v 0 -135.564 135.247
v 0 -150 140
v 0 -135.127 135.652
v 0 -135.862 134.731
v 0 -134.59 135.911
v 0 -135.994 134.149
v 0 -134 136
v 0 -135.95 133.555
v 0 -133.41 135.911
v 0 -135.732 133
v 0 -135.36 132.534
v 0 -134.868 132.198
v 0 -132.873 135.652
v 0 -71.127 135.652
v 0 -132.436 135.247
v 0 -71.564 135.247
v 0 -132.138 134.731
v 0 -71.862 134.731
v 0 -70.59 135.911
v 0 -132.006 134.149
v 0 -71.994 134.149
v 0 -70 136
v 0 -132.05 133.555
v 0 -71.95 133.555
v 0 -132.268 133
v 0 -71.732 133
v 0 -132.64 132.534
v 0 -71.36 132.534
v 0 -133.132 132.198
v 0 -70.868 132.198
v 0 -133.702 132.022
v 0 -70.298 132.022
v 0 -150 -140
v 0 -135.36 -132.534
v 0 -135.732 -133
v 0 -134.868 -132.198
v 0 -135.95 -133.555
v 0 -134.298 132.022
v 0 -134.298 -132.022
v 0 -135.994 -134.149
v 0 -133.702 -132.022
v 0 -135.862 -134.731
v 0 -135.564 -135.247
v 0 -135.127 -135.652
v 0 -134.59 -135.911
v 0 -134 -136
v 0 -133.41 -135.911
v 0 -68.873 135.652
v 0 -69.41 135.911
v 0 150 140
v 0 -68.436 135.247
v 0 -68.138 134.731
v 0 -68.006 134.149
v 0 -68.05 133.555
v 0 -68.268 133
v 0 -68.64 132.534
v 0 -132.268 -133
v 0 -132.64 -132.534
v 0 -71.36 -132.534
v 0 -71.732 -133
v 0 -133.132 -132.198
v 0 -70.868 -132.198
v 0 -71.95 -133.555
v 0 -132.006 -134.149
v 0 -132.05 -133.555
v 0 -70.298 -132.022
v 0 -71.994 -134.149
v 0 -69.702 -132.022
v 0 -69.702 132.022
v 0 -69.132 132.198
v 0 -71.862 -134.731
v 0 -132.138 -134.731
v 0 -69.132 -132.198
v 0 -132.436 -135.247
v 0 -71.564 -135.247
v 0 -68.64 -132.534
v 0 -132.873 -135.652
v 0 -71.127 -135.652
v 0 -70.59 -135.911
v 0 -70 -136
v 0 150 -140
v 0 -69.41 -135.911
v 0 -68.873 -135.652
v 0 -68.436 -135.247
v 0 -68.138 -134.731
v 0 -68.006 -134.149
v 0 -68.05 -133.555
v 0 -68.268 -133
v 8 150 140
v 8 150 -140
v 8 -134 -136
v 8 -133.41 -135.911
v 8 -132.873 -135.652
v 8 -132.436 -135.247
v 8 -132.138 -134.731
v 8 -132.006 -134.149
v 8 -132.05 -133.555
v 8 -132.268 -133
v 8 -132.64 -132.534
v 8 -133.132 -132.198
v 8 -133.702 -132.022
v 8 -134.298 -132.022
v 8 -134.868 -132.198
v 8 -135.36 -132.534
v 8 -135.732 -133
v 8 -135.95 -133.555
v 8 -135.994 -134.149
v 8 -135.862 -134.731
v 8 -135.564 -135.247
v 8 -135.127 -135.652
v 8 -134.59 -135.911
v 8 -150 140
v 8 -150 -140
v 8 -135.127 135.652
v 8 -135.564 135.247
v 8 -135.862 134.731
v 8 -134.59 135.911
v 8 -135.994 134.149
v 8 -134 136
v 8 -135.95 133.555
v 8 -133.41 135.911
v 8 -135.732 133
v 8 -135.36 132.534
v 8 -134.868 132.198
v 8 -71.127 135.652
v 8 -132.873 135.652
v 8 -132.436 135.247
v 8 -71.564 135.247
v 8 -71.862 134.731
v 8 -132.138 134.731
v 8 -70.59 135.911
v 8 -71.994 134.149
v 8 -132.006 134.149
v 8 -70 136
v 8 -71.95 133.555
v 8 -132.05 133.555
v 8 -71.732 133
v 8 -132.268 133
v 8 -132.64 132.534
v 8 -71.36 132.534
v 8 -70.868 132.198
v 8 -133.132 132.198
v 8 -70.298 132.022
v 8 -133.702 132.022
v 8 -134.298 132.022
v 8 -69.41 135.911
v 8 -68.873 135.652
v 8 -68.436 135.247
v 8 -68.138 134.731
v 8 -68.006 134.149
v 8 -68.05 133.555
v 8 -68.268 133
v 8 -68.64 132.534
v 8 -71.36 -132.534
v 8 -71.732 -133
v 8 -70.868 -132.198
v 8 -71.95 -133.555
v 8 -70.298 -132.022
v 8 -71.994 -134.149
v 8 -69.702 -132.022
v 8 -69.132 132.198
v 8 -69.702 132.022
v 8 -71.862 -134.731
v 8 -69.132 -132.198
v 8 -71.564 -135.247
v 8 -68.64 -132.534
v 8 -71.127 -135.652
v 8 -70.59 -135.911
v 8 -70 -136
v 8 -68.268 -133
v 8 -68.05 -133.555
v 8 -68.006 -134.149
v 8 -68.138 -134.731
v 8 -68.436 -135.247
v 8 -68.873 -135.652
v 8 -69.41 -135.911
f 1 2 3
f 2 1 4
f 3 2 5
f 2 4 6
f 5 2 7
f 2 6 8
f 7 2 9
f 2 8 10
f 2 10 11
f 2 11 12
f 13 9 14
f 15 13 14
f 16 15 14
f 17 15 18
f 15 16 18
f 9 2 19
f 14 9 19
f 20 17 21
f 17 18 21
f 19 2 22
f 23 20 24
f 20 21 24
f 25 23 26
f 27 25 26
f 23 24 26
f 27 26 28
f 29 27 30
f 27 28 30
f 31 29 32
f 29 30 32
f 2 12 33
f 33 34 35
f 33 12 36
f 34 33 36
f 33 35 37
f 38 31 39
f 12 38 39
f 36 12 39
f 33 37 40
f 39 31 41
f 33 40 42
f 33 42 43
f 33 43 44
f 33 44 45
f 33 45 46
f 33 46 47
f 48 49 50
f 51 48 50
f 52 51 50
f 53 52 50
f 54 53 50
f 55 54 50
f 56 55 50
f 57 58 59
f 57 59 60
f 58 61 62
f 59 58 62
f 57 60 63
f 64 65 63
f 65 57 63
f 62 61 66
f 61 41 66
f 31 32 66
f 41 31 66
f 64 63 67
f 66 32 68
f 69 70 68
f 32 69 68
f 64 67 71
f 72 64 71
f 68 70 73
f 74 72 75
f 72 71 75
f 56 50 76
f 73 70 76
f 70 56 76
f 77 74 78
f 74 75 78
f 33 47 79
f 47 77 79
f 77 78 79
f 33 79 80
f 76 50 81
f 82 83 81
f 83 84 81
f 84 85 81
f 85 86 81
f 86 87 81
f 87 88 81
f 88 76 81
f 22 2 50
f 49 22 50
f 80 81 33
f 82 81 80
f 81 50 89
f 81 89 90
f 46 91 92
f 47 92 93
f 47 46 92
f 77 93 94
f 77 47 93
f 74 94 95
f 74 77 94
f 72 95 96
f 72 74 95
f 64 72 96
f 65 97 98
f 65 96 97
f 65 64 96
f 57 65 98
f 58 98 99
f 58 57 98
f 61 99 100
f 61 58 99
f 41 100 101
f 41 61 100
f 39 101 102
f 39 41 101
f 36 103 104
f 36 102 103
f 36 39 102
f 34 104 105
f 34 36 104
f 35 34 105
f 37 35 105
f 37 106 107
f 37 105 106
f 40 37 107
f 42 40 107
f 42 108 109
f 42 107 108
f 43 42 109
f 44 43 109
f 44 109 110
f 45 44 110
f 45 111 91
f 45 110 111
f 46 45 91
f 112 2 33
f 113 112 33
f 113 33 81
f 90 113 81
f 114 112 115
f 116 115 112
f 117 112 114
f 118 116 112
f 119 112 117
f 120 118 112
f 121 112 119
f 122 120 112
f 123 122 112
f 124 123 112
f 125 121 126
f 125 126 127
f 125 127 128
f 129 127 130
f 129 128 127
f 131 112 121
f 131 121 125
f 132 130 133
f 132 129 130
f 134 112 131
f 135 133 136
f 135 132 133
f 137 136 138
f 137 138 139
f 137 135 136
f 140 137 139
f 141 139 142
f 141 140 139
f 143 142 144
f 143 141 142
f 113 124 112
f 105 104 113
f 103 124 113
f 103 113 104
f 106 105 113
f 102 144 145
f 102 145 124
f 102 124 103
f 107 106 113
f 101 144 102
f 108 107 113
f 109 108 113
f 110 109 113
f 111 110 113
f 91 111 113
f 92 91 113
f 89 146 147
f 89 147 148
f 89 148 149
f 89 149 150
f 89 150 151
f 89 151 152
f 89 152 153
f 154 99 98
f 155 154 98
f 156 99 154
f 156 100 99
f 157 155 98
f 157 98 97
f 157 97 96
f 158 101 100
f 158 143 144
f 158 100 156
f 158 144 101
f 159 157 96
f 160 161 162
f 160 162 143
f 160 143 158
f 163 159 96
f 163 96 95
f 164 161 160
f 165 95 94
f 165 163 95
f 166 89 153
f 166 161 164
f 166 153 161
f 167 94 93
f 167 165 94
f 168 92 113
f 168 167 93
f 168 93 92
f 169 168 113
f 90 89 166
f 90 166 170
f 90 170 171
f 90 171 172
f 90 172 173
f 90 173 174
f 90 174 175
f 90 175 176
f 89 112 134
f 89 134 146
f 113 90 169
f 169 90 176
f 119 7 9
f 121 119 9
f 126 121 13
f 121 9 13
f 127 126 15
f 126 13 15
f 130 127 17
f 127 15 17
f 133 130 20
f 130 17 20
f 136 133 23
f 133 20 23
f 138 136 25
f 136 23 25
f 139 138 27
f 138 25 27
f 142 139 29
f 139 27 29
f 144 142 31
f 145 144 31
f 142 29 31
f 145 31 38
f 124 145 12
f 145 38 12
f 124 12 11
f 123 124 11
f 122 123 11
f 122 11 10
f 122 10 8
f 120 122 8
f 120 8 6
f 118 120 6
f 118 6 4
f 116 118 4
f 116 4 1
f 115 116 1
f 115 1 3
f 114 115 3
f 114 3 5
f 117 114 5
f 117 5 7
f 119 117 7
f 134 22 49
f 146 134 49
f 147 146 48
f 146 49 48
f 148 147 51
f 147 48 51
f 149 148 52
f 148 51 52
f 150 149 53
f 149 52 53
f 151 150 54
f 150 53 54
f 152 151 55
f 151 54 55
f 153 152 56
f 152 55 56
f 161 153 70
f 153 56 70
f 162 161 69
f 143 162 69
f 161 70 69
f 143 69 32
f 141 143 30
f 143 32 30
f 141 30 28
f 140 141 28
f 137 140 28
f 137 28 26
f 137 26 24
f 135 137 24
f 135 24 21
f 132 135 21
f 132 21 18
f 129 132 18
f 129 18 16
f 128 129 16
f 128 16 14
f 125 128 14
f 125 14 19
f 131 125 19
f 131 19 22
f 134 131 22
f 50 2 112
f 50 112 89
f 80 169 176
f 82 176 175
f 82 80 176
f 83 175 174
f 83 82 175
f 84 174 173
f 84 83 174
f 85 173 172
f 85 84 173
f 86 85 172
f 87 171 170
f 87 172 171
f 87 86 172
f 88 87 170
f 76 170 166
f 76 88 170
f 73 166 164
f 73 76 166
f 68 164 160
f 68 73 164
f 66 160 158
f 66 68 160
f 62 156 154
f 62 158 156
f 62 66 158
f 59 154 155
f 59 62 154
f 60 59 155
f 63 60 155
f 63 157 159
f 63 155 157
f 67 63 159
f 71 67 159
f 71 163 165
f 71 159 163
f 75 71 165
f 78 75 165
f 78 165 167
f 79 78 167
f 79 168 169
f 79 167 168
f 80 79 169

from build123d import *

# Parameters (mm, degrees)
SKETCH1_W           = 280
SKETCH1_H           = 300
BOSS_EXTRUDE1_DEPTH = 8
SKETCH2_R           = 2
CUT_EXTRUDE1_DEPTH  = 206.338744517


with BuildPart() as part:
    # Sketch1 → Boss-Extrude1 (new body)
    with BuildSketch(Plane(origin=(0, 0, 0), x_dir=(0, 0, -1), z_dir=(1, 0, 0))):
        Rectangle(SKETCH1_W, SKETCH1_H)
    extrude(amount=BOSS_EXTRUDE1_DEPTH)

    # Sketch2 → Cut-Extrude1 (cut, through all)
    with BuildSketch(Plane(origin=(0, 0, 0), x_dir=(0, 0, -1), z_dir=(1, 0, 0))):
        with Locations((134, -134)):
            Circle(SKETCH2_R)
        with Locations((134, -70)):
            Circle(SKETCH2_R)
    cut_extrude1 = extrude(amount=CUT_EXTRUDE1_DEPTH, mode=Mode.SUBTRACT)

    # Mirror1: Cut-Extrude1 across plane
    add(cut_extrude1.mirror(Plane.XY), mode=Mode.SUBTRACT)


solid = part.part
